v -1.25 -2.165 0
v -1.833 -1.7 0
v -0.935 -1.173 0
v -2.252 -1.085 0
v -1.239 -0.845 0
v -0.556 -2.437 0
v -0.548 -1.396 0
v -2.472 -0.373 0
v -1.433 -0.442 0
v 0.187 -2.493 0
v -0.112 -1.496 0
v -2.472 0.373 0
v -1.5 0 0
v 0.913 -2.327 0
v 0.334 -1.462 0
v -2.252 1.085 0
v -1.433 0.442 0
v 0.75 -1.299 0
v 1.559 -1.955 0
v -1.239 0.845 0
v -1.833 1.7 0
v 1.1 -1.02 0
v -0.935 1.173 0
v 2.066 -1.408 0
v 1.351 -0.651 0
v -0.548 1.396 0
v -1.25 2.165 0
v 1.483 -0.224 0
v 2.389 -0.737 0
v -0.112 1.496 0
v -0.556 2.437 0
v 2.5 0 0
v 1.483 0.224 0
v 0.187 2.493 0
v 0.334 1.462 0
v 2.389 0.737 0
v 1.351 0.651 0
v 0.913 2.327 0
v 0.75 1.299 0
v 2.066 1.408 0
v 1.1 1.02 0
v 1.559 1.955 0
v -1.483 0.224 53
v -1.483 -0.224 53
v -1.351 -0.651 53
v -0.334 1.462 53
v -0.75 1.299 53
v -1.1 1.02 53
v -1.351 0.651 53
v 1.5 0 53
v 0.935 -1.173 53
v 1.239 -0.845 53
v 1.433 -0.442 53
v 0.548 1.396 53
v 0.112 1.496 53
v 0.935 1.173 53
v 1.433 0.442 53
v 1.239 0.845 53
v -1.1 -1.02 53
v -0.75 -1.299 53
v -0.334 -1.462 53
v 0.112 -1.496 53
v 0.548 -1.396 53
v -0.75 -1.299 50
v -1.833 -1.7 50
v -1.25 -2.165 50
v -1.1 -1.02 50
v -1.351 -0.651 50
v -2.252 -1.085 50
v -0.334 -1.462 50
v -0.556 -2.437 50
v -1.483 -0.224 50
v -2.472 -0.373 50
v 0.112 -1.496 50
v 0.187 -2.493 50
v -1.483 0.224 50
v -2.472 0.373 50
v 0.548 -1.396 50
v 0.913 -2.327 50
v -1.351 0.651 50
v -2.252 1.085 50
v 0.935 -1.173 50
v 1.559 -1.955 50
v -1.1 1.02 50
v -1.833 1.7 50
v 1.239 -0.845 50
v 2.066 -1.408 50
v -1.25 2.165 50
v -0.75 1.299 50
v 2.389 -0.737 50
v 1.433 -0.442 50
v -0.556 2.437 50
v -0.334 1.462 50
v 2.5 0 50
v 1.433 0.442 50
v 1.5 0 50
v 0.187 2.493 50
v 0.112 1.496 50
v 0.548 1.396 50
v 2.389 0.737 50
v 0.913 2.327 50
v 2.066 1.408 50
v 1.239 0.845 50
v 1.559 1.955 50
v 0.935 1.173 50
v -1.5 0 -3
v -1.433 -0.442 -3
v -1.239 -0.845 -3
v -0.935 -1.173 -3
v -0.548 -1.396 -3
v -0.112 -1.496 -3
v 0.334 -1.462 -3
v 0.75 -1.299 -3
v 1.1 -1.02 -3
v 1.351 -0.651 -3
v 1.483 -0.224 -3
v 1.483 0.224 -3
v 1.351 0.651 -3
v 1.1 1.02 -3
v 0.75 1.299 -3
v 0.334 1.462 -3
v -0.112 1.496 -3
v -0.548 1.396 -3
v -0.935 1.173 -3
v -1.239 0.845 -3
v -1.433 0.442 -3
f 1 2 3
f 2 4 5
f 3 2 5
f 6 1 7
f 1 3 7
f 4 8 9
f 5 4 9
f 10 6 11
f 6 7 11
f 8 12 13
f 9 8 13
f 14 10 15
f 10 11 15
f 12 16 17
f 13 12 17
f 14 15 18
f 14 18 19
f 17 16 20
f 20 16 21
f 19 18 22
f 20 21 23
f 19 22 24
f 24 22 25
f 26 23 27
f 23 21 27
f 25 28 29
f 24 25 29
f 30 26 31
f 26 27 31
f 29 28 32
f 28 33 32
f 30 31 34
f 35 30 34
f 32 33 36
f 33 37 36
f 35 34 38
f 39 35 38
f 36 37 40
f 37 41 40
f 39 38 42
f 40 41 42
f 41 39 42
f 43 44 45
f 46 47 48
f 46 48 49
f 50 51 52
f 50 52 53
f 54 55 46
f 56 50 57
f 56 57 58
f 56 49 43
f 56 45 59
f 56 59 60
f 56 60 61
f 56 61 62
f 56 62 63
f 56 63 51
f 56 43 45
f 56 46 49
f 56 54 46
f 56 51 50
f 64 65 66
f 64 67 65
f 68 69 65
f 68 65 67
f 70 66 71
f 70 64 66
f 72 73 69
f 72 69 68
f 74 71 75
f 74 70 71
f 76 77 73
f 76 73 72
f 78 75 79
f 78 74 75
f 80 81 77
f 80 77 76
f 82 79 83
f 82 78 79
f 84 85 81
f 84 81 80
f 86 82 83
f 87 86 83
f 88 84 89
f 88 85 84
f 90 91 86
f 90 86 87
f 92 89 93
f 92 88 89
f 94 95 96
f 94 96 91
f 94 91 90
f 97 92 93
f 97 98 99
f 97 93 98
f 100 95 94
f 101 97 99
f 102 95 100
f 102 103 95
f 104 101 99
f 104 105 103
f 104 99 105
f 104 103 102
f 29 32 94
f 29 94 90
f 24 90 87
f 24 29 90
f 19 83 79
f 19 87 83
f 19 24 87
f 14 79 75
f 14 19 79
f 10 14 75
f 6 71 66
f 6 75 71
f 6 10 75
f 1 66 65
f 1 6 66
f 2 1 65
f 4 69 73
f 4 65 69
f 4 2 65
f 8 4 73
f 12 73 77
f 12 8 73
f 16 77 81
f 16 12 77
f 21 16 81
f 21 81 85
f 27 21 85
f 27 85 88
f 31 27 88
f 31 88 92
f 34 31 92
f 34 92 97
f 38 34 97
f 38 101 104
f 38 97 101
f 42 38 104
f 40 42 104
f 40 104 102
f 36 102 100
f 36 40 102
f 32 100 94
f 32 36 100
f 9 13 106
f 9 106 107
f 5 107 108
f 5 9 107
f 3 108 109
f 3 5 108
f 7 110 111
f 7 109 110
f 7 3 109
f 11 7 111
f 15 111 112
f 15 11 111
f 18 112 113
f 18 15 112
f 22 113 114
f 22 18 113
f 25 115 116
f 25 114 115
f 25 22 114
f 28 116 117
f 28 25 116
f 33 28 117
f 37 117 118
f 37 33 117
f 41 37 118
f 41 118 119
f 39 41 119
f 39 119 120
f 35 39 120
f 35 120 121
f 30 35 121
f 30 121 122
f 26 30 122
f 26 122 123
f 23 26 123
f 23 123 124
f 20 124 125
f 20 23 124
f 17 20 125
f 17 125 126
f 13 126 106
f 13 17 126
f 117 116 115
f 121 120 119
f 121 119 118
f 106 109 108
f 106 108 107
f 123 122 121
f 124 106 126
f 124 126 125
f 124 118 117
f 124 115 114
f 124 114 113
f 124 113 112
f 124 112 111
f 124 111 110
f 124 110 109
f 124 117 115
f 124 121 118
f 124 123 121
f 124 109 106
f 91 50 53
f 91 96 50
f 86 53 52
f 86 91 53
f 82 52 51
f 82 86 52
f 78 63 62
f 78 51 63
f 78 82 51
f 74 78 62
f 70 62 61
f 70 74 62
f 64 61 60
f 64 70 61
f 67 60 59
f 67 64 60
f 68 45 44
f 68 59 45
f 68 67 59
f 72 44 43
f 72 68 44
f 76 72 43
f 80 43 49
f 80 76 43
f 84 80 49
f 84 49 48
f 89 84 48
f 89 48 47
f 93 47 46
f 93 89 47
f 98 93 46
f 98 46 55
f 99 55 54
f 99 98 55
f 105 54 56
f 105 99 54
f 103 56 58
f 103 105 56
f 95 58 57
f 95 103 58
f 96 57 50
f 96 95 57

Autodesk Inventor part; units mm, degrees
ref_plane "YZ Plane" through (0, 0, 0) normal (1, 0, 0) x (0, 1, 0)
ref_plane "XZ Plane" through (0, 0, 0) normal (0, 1, 0) x (-1, 0, 0)
ref_plane "XY Plane" through (0, 0, 0) normal (0, 0, 1) x (1, 0, 0)
sketch "Sketch1" plane through (0, 0, 0) normal (0, 0, 1) x (1, 0, 0)
  circle A0 centre (0, 0) radius 2.5
  dimension "d0" = 5
extrude "Extrusion1" add sketch "Sketch1" along normal blind 50
sketch "Sketch2" plane through (0, 0, 50) normal (0, 0, 1) x (1, 0, 0)
  circle A0 centre (0, 0) radius 2.5 projected
  circle A1 centre (0, 0) radius 1.5
  dimension "d3" = 3
extrude "Extrusion2" add sketch "Sketch2" along normal blind 3 contours A1
thread "Thread1" size "M3x0.5" class "6g" standard "ANSI Metric M Profile" full length
sketch "Sketch3" plane through (0, 0, 0) normal (0, 0, -1) x (-1, 0, 0)
  circle A0 centre (0, 0) radius 2.5 projected
  circle A1 centre (0, 0) radius 1.5
  dimension "d8" = 3
extrude "Extrusion3" add sketch "Sketch3" along normal blind 3 contours A1
thread "Thread2" size "M3x0.5" class "6g" standard "ANSI Metric M Profile" full length
properties part number "spacer 4 cm"
